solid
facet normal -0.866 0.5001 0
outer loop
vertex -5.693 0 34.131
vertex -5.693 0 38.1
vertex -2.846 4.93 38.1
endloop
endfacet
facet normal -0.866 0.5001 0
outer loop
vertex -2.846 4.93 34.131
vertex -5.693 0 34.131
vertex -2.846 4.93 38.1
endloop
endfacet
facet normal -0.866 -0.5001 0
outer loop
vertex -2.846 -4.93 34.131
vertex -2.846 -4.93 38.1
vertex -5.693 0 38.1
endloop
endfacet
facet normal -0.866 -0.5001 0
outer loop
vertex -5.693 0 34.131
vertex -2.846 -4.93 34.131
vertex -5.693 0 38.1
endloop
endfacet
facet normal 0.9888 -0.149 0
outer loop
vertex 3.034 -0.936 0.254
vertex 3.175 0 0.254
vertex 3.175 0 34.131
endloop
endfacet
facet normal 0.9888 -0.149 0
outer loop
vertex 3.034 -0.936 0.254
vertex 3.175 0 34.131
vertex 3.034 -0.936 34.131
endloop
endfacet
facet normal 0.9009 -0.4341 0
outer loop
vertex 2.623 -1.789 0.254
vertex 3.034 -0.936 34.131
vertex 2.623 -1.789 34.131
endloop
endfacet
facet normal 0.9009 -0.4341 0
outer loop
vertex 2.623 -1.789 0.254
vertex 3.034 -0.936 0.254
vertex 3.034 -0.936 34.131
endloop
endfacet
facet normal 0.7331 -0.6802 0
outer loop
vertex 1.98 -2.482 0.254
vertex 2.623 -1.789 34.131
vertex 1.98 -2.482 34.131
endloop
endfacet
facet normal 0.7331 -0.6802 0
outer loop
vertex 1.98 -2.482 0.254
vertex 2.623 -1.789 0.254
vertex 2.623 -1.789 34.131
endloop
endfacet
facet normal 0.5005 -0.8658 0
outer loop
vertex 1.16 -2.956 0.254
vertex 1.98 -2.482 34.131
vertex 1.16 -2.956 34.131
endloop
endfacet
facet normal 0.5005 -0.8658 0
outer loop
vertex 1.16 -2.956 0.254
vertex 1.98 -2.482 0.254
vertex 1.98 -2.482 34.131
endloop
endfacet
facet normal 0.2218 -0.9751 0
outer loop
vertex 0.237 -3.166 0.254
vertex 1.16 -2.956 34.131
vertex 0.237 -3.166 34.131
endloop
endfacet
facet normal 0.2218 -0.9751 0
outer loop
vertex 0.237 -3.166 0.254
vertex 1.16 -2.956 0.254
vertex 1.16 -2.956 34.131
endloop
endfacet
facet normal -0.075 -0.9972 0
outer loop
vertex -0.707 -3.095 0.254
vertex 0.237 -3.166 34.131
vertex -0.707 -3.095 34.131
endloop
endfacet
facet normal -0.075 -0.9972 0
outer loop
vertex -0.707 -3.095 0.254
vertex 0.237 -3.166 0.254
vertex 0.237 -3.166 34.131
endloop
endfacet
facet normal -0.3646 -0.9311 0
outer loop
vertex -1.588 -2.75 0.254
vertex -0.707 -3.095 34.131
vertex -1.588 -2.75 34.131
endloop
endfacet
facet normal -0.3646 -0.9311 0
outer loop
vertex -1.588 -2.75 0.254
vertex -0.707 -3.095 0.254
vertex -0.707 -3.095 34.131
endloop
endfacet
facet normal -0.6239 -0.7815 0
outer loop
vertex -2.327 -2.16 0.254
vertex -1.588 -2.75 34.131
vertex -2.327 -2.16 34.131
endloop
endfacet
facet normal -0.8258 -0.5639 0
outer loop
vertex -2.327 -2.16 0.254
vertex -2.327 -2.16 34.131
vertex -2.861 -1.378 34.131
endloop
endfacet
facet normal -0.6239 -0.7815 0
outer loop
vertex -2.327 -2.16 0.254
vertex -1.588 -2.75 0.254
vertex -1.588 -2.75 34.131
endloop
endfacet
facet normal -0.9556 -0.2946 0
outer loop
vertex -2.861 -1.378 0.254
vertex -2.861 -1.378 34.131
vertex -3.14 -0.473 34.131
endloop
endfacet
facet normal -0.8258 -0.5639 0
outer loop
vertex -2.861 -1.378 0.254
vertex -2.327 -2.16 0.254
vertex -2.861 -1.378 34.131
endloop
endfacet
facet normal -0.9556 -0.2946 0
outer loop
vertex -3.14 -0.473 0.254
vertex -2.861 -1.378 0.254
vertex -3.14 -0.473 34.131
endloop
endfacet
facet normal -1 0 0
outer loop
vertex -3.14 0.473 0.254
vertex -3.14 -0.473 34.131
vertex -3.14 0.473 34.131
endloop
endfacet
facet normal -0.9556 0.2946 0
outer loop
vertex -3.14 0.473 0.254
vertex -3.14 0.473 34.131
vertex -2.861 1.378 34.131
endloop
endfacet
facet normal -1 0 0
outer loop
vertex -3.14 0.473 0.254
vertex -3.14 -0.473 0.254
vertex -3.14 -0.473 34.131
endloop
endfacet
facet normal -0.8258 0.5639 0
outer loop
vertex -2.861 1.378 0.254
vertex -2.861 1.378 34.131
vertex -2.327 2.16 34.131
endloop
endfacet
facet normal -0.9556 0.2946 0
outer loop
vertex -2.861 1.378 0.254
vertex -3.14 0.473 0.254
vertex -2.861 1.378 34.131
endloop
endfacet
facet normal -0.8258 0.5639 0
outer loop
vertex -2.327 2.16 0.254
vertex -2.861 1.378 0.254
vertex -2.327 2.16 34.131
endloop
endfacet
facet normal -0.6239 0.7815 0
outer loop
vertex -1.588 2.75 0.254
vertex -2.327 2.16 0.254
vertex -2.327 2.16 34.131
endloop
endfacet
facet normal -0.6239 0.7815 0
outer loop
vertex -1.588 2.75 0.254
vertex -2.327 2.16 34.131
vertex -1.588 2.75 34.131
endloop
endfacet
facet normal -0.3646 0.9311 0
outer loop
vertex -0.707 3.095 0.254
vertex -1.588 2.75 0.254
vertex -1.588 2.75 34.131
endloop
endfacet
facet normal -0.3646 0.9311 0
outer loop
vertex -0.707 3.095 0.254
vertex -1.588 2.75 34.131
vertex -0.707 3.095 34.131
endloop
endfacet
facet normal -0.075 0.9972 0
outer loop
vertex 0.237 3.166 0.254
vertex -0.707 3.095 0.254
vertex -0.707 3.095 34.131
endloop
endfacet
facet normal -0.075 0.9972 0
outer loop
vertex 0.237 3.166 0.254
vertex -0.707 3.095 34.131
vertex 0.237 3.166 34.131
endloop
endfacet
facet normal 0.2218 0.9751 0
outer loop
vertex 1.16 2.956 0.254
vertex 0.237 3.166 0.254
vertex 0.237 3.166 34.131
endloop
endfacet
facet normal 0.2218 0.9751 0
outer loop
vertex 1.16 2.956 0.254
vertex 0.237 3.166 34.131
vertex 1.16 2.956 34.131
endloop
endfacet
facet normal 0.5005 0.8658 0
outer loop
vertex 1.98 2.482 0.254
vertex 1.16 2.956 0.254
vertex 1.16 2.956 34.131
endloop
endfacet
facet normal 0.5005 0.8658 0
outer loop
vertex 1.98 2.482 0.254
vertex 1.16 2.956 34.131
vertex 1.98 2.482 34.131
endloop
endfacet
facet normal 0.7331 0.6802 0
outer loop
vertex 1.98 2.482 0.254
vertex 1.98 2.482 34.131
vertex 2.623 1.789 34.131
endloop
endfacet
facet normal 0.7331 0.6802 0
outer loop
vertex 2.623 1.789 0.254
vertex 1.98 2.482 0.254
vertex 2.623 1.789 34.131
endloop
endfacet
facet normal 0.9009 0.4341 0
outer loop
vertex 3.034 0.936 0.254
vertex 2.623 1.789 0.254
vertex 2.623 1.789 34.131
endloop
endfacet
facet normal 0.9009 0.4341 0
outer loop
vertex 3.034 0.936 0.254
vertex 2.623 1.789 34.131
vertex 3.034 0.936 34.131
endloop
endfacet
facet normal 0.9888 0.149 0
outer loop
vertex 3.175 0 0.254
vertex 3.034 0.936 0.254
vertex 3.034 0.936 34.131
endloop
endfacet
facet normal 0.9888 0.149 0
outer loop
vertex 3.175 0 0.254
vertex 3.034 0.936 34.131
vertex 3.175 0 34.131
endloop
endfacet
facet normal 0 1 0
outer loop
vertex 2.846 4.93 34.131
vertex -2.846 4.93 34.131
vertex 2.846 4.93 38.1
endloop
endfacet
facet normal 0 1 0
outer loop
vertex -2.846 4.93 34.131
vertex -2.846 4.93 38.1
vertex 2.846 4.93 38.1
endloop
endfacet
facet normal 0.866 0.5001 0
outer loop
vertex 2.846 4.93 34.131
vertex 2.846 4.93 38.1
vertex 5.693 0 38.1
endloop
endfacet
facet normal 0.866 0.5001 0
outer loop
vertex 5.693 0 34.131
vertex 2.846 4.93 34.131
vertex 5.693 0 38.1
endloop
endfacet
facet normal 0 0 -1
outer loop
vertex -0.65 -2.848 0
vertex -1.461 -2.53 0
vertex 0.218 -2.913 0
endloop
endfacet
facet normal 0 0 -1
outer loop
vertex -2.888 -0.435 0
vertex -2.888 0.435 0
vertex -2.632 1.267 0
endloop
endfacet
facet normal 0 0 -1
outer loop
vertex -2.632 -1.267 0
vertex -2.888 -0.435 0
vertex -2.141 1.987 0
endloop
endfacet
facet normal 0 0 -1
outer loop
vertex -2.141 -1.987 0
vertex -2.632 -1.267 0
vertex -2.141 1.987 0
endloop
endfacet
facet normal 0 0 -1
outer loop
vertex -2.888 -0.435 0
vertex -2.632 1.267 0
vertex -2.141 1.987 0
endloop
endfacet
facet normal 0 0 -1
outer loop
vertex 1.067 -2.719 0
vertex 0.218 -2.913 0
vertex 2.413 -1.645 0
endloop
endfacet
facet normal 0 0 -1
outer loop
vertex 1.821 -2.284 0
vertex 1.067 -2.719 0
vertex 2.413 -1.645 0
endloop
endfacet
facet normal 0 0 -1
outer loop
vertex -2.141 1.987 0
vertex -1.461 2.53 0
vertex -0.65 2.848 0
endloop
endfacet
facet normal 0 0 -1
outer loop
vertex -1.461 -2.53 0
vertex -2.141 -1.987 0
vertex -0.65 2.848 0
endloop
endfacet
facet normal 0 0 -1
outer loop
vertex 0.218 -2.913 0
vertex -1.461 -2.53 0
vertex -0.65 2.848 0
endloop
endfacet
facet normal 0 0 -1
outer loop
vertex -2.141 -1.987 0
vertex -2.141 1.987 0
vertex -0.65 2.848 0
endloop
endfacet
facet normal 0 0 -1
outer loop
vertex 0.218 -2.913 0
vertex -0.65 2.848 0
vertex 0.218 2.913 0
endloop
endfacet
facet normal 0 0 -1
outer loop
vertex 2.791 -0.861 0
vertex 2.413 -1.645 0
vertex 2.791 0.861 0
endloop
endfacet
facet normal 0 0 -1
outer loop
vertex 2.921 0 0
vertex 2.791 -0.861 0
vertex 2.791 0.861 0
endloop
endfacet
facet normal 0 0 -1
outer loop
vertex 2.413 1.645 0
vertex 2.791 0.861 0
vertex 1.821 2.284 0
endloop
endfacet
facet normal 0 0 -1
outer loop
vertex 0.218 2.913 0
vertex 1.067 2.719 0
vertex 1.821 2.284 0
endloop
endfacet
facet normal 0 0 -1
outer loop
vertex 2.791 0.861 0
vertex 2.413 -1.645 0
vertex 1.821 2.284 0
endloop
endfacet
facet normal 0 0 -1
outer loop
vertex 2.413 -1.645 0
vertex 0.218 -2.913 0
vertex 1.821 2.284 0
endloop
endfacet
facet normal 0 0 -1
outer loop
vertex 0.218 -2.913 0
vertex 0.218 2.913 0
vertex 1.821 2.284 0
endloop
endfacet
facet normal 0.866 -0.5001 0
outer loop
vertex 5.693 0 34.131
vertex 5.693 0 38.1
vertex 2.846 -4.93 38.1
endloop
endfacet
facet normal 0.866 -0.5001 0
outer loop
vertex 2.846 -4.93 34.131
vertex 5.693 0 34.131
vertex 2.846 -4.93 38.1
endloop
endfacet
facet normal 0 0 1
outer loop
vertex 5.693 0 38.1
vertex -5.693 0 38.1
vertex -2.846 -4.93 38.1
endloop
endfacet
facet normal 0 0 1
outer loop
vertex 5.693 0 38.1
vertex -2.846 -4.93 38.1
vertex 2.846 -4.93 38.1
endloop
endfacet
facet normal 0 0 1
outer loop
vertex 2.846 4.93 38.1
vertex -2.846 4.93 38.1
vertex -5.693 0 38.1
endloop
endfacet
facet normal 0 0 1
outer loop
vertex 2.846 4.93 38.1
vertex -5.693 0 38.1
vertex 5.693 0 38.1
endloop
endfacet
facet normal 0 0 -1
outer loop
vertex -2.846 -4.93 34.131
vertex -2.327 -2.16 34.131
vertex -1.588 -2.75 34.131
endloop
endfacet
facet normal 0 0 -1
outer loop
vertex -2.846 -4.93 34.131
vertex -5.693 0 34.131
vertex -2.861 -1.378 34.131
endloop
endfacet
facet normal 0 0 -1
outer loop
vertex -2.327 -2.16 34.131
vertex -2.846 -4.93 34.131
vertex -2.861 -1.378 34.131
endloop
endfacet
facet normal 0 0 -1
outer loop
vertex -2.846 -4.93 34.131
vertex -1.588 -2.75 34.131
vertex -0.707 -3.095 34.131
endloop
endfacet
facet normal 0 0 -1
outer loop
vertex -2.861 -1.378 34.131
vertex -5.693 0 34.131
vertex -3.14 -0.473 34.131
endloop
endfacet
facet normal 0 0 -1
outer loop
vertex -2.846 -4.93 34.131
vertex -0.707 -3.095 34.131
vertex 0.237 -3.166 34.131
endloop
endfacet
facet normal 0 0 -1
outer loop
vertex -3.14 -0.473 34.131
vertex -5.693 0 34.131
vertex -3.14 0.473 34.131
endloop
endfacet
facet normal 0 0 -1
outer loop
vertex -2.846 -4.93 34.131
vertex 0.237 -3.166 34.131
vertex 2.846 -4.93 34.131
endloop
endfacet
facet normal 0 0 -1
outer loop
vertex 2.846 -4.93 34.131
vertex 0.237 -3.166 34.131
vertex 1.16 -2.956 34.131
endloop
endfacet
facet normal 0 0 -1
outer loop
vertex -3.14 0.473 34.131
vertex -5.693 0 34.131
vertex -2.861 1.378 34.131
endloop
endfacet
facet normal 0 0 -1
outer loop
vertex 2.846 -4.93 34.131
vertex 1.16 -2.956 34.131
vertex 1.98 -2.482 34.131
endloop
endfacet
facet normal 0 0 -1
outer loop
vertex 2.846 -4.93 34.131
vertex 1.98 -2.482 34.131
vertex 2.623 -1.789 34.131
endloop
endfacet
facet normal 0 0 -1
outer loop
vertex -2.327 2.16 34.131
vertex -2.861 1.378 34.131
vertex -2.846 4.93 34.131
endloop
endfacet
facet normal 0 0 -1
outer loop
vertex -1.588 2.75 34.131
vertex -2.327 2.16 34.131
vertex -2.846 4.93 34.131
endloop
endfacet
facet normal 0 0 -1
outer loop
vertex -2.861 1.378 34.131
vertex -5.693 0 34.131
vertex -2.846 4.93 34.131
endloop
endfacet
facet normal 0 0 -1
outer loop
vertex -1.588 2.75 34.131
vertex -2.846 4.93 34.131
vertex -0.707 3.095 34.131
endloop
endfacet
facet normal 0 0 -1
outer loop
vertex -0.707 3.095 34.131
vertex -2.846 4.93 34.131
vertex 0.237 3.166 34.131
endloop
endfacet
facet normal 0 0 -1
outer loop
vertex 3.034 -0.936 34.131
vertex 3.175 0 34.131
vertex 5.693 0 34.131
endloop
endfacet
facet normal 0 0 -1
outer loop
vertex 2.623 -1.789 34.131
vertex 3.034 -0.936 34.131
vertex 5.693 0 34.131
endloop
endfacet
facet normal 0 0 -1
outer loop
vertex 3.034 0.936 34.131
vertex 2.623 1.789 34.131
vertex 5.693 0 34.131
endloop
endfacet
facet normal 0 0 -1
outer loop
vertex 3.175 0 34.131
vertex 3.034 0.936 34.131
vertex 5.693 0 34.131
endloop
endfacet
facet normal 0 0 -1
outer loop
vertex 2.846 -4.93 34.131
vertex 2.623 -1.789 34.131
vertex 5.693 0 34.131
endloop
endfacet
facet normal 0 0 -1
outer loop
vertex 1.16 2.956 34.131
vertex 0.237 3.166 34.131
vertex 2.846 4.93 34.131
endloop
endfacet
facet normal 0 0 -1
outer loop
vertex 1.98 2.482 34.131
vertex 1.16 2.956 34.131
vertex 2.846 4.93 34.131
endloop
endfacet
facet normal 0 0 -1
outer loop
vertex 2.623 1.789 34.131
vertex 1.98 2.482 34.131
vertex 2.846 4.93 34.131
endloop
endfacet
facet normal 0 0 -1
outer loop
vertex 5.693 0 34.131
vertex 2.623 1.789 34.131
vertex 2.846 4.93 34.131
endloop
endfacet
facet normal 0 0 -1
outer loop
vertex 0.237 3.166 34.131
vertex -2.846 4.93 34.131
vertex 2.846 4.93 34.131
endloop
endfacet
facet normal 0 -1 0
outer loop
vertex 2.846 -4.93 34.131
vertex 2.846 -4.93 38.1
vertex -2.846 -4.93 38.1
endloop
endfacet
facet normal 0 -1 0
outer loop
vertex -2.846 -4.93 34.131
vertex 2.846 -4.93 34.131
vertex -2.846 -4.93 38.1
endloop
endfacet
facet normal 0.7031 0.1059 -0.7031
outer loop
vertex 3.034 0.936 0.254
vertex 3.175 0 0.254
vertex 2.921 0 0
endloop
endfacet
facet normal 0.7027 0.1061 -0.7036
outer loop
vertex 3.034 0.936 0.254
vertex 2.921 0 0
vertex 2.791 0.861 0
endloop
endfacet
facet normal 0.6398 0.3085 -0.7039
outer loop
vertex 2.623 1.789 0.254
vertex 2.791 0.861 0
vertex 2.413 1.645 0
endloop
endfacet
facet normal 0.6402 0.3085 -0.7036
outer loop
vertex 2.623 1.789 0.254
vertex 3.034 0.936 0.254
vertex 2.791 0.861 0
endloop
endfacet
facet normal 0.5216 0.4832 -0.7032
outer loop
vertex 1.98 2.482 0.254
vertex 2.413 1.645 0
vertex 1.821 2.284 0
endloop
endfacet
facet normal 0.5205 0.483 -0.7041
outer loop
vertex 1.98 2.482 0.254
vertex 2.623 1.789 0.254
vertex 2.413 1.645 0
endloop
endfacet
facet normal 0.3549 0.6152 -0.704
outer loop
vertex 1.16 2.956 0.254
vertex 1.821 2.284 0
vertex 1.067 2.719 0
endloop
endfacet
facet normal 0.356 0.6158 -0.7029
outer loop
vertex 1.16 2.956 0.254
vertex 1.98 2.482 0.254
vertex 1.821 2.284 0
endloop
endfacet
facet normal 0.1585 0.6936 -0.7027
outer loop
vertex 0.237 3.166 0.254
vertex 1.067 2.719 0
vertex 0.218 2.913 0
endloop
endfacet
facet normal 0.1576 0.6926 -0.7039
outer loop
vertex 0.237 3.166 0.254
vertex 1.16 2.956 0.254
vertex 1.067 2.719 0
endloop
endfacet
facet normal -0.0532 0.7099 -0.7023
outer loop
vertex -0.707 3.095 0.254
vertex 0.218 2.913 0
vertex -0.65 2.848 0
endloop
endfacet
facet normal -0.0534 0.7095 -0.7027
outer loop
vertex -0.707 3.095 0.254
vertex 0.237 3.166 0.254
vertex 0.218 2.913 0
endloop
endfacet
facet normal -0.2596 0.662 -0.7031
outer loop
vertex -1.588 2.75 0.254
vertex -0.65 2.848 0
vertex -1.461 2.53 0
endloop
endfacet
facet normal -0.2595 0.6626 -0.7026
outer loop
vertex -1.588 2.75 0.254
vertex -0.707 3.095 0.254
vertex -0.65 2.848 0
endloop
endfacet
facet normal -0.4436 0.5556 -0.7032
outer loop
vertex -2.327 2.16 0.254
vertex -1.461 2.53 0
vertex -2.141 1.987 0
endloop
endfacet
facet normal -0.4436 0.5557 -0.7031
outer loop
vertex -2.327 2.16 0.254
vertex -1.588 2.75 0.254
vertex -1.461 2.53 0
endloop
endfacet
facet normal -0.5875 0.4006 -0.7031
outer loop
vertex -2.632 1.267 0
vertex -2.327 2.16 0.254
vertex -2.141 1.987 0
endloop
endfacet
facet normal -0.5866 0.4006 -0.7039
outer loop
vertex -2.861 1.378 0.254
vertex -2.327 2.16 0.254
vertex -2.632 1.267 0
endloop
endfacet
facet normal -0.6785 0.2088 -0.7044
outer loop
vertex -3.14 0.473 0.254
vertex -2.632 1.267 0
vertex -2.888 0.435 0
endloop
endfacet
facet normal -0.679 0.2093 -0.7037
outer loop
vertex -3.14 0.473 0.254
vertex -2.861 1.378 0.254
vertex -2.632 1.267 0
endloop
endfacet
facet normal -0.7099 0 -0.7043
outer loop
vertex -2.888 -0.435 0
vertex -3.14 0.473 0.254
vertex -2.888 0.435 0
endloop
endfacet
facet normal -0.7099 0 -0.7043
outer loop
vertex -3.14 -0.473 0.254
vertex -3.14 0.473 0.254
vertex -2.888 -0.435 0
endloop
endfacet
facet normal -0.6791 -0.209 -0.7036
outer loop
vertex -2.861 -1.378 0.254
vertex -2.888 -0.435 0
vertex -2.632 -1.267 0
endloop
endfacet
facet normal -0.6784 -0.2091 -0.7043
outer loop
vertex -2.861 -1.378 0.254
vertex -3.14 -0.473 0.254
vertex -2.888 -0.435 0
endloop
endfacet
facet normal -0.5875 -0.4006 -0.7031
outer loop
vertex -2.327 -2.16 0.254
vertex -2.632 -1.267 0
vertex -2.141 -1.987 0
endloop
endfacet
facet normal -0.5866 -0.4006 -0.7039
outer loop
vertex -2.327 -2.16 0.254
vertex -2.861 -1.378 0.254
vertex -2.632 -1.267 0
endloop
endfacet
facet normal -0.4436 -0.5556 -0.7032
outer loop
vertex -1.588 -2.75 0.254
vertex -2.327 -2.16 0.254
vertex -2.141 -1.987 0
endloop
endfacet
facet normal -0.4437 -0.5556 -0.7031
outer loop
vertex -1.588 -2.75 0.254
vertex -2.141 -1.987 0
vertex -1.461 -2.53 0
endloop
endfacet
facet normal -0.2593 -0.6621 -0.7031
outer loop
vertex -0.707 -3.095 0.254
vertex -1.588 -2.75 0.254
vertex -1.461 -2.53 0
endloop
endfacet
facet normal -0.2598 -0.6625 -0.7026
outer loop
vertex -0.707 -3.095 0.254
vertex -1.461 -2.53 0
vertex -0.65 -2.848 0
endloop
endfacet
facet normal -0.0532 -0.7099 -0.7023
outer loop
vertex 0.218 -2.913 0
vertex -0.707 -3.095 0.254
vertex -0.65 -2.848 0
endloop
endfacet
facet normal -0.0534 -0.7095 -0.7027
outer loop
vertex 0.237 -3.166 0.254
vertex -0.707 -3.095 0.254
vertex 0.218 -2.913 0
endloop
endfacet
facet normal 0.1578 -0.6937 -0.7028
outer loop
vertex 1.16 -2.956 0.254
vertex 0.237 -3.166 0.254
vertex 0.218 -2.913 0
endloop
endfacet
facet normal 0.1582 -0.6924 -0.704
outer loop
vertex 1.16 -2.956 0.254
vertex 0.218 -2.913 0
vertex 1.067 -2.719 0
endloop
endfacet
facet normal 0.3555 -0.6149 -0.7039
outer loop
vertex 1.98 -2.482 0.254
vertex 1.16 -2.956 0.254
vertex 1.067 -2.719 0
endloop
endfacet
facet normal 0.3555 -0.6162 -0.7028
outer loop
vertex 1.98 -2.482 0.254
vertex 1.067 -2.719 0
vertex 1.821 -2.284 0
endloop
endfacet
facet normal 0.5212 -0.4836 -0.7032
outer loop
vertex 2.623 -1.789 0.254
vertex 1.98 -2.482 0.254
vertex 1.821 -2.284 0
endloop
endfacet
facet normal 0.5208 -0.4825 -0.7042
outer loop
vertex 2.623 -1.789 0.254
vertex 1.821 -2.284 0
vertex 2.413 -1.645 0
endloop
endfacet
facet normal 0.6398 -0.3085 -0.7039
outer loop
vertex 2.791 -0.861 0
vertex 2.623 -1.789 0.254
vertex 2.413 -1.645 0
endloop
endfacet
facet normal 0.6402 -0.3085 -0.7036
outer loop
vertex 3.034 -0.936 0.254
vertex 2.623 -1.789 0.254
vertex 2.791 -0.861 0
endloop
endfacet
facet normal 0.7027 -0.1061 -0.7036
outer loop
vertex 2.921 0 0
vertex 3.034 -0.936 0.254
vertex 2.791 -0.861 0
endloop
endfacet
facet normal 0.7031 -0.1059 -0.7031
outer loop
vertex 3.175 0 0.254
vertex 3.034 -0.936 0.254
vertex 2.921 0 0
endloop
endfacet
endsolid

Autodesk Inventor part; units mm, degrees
ref_plane "YZ Plane" through (0, 0, 0) normal (1, 0, 0) x (0, 1, 0)
ref_plane "XZ Plane" through (0, 0, 0) normal (0, 1, 0) x (-1, 0, 0)
ref_plane "XY Plane" through (0, 0, 0) normal (0, 0, 1) x (1, 0, 0)
sketch "Sketch1" plane through (0, 0, 0) normal (0, 0, 1) x (1, 0, 0)
  circle A0 centre (0, 0) radius 3.175
  dimension "d0" = 6.35
extrude "Extrusion1" add sketch "Sketch1" along normal blind 38.1
sketch "Sketch2" plane through (0, 0, 38.1) normal (0, 0, 1) x (1, 0, 0)
  line L0 (5.693, 0) -> (2.8465, -4.9303)
  line L1 (2.8465, -4.9303) -> (-2.8465, -4.9303)
  line L2 (-2.8465, -4.9303) -> (-5.693, 0)
  line L3 (-5.693, 0) -> (-2.8465, 4.9303)
  line L4 (-2.8465, 4.9303) -> (2.8465, 4.9303)
  line L5 (2.8465, 4.9303) -> (5.693, 0)
  point P0 (0, 0)
  point P1 (0, 0)
extrude "Extrusion2" add sketch "Sketch2" against normal blind 3.9688
chamfer "Chamfer1" distance 0.254 angle 45 1 edges at (-3.175, 0, 0)
properties part number "1.5in bolt"
